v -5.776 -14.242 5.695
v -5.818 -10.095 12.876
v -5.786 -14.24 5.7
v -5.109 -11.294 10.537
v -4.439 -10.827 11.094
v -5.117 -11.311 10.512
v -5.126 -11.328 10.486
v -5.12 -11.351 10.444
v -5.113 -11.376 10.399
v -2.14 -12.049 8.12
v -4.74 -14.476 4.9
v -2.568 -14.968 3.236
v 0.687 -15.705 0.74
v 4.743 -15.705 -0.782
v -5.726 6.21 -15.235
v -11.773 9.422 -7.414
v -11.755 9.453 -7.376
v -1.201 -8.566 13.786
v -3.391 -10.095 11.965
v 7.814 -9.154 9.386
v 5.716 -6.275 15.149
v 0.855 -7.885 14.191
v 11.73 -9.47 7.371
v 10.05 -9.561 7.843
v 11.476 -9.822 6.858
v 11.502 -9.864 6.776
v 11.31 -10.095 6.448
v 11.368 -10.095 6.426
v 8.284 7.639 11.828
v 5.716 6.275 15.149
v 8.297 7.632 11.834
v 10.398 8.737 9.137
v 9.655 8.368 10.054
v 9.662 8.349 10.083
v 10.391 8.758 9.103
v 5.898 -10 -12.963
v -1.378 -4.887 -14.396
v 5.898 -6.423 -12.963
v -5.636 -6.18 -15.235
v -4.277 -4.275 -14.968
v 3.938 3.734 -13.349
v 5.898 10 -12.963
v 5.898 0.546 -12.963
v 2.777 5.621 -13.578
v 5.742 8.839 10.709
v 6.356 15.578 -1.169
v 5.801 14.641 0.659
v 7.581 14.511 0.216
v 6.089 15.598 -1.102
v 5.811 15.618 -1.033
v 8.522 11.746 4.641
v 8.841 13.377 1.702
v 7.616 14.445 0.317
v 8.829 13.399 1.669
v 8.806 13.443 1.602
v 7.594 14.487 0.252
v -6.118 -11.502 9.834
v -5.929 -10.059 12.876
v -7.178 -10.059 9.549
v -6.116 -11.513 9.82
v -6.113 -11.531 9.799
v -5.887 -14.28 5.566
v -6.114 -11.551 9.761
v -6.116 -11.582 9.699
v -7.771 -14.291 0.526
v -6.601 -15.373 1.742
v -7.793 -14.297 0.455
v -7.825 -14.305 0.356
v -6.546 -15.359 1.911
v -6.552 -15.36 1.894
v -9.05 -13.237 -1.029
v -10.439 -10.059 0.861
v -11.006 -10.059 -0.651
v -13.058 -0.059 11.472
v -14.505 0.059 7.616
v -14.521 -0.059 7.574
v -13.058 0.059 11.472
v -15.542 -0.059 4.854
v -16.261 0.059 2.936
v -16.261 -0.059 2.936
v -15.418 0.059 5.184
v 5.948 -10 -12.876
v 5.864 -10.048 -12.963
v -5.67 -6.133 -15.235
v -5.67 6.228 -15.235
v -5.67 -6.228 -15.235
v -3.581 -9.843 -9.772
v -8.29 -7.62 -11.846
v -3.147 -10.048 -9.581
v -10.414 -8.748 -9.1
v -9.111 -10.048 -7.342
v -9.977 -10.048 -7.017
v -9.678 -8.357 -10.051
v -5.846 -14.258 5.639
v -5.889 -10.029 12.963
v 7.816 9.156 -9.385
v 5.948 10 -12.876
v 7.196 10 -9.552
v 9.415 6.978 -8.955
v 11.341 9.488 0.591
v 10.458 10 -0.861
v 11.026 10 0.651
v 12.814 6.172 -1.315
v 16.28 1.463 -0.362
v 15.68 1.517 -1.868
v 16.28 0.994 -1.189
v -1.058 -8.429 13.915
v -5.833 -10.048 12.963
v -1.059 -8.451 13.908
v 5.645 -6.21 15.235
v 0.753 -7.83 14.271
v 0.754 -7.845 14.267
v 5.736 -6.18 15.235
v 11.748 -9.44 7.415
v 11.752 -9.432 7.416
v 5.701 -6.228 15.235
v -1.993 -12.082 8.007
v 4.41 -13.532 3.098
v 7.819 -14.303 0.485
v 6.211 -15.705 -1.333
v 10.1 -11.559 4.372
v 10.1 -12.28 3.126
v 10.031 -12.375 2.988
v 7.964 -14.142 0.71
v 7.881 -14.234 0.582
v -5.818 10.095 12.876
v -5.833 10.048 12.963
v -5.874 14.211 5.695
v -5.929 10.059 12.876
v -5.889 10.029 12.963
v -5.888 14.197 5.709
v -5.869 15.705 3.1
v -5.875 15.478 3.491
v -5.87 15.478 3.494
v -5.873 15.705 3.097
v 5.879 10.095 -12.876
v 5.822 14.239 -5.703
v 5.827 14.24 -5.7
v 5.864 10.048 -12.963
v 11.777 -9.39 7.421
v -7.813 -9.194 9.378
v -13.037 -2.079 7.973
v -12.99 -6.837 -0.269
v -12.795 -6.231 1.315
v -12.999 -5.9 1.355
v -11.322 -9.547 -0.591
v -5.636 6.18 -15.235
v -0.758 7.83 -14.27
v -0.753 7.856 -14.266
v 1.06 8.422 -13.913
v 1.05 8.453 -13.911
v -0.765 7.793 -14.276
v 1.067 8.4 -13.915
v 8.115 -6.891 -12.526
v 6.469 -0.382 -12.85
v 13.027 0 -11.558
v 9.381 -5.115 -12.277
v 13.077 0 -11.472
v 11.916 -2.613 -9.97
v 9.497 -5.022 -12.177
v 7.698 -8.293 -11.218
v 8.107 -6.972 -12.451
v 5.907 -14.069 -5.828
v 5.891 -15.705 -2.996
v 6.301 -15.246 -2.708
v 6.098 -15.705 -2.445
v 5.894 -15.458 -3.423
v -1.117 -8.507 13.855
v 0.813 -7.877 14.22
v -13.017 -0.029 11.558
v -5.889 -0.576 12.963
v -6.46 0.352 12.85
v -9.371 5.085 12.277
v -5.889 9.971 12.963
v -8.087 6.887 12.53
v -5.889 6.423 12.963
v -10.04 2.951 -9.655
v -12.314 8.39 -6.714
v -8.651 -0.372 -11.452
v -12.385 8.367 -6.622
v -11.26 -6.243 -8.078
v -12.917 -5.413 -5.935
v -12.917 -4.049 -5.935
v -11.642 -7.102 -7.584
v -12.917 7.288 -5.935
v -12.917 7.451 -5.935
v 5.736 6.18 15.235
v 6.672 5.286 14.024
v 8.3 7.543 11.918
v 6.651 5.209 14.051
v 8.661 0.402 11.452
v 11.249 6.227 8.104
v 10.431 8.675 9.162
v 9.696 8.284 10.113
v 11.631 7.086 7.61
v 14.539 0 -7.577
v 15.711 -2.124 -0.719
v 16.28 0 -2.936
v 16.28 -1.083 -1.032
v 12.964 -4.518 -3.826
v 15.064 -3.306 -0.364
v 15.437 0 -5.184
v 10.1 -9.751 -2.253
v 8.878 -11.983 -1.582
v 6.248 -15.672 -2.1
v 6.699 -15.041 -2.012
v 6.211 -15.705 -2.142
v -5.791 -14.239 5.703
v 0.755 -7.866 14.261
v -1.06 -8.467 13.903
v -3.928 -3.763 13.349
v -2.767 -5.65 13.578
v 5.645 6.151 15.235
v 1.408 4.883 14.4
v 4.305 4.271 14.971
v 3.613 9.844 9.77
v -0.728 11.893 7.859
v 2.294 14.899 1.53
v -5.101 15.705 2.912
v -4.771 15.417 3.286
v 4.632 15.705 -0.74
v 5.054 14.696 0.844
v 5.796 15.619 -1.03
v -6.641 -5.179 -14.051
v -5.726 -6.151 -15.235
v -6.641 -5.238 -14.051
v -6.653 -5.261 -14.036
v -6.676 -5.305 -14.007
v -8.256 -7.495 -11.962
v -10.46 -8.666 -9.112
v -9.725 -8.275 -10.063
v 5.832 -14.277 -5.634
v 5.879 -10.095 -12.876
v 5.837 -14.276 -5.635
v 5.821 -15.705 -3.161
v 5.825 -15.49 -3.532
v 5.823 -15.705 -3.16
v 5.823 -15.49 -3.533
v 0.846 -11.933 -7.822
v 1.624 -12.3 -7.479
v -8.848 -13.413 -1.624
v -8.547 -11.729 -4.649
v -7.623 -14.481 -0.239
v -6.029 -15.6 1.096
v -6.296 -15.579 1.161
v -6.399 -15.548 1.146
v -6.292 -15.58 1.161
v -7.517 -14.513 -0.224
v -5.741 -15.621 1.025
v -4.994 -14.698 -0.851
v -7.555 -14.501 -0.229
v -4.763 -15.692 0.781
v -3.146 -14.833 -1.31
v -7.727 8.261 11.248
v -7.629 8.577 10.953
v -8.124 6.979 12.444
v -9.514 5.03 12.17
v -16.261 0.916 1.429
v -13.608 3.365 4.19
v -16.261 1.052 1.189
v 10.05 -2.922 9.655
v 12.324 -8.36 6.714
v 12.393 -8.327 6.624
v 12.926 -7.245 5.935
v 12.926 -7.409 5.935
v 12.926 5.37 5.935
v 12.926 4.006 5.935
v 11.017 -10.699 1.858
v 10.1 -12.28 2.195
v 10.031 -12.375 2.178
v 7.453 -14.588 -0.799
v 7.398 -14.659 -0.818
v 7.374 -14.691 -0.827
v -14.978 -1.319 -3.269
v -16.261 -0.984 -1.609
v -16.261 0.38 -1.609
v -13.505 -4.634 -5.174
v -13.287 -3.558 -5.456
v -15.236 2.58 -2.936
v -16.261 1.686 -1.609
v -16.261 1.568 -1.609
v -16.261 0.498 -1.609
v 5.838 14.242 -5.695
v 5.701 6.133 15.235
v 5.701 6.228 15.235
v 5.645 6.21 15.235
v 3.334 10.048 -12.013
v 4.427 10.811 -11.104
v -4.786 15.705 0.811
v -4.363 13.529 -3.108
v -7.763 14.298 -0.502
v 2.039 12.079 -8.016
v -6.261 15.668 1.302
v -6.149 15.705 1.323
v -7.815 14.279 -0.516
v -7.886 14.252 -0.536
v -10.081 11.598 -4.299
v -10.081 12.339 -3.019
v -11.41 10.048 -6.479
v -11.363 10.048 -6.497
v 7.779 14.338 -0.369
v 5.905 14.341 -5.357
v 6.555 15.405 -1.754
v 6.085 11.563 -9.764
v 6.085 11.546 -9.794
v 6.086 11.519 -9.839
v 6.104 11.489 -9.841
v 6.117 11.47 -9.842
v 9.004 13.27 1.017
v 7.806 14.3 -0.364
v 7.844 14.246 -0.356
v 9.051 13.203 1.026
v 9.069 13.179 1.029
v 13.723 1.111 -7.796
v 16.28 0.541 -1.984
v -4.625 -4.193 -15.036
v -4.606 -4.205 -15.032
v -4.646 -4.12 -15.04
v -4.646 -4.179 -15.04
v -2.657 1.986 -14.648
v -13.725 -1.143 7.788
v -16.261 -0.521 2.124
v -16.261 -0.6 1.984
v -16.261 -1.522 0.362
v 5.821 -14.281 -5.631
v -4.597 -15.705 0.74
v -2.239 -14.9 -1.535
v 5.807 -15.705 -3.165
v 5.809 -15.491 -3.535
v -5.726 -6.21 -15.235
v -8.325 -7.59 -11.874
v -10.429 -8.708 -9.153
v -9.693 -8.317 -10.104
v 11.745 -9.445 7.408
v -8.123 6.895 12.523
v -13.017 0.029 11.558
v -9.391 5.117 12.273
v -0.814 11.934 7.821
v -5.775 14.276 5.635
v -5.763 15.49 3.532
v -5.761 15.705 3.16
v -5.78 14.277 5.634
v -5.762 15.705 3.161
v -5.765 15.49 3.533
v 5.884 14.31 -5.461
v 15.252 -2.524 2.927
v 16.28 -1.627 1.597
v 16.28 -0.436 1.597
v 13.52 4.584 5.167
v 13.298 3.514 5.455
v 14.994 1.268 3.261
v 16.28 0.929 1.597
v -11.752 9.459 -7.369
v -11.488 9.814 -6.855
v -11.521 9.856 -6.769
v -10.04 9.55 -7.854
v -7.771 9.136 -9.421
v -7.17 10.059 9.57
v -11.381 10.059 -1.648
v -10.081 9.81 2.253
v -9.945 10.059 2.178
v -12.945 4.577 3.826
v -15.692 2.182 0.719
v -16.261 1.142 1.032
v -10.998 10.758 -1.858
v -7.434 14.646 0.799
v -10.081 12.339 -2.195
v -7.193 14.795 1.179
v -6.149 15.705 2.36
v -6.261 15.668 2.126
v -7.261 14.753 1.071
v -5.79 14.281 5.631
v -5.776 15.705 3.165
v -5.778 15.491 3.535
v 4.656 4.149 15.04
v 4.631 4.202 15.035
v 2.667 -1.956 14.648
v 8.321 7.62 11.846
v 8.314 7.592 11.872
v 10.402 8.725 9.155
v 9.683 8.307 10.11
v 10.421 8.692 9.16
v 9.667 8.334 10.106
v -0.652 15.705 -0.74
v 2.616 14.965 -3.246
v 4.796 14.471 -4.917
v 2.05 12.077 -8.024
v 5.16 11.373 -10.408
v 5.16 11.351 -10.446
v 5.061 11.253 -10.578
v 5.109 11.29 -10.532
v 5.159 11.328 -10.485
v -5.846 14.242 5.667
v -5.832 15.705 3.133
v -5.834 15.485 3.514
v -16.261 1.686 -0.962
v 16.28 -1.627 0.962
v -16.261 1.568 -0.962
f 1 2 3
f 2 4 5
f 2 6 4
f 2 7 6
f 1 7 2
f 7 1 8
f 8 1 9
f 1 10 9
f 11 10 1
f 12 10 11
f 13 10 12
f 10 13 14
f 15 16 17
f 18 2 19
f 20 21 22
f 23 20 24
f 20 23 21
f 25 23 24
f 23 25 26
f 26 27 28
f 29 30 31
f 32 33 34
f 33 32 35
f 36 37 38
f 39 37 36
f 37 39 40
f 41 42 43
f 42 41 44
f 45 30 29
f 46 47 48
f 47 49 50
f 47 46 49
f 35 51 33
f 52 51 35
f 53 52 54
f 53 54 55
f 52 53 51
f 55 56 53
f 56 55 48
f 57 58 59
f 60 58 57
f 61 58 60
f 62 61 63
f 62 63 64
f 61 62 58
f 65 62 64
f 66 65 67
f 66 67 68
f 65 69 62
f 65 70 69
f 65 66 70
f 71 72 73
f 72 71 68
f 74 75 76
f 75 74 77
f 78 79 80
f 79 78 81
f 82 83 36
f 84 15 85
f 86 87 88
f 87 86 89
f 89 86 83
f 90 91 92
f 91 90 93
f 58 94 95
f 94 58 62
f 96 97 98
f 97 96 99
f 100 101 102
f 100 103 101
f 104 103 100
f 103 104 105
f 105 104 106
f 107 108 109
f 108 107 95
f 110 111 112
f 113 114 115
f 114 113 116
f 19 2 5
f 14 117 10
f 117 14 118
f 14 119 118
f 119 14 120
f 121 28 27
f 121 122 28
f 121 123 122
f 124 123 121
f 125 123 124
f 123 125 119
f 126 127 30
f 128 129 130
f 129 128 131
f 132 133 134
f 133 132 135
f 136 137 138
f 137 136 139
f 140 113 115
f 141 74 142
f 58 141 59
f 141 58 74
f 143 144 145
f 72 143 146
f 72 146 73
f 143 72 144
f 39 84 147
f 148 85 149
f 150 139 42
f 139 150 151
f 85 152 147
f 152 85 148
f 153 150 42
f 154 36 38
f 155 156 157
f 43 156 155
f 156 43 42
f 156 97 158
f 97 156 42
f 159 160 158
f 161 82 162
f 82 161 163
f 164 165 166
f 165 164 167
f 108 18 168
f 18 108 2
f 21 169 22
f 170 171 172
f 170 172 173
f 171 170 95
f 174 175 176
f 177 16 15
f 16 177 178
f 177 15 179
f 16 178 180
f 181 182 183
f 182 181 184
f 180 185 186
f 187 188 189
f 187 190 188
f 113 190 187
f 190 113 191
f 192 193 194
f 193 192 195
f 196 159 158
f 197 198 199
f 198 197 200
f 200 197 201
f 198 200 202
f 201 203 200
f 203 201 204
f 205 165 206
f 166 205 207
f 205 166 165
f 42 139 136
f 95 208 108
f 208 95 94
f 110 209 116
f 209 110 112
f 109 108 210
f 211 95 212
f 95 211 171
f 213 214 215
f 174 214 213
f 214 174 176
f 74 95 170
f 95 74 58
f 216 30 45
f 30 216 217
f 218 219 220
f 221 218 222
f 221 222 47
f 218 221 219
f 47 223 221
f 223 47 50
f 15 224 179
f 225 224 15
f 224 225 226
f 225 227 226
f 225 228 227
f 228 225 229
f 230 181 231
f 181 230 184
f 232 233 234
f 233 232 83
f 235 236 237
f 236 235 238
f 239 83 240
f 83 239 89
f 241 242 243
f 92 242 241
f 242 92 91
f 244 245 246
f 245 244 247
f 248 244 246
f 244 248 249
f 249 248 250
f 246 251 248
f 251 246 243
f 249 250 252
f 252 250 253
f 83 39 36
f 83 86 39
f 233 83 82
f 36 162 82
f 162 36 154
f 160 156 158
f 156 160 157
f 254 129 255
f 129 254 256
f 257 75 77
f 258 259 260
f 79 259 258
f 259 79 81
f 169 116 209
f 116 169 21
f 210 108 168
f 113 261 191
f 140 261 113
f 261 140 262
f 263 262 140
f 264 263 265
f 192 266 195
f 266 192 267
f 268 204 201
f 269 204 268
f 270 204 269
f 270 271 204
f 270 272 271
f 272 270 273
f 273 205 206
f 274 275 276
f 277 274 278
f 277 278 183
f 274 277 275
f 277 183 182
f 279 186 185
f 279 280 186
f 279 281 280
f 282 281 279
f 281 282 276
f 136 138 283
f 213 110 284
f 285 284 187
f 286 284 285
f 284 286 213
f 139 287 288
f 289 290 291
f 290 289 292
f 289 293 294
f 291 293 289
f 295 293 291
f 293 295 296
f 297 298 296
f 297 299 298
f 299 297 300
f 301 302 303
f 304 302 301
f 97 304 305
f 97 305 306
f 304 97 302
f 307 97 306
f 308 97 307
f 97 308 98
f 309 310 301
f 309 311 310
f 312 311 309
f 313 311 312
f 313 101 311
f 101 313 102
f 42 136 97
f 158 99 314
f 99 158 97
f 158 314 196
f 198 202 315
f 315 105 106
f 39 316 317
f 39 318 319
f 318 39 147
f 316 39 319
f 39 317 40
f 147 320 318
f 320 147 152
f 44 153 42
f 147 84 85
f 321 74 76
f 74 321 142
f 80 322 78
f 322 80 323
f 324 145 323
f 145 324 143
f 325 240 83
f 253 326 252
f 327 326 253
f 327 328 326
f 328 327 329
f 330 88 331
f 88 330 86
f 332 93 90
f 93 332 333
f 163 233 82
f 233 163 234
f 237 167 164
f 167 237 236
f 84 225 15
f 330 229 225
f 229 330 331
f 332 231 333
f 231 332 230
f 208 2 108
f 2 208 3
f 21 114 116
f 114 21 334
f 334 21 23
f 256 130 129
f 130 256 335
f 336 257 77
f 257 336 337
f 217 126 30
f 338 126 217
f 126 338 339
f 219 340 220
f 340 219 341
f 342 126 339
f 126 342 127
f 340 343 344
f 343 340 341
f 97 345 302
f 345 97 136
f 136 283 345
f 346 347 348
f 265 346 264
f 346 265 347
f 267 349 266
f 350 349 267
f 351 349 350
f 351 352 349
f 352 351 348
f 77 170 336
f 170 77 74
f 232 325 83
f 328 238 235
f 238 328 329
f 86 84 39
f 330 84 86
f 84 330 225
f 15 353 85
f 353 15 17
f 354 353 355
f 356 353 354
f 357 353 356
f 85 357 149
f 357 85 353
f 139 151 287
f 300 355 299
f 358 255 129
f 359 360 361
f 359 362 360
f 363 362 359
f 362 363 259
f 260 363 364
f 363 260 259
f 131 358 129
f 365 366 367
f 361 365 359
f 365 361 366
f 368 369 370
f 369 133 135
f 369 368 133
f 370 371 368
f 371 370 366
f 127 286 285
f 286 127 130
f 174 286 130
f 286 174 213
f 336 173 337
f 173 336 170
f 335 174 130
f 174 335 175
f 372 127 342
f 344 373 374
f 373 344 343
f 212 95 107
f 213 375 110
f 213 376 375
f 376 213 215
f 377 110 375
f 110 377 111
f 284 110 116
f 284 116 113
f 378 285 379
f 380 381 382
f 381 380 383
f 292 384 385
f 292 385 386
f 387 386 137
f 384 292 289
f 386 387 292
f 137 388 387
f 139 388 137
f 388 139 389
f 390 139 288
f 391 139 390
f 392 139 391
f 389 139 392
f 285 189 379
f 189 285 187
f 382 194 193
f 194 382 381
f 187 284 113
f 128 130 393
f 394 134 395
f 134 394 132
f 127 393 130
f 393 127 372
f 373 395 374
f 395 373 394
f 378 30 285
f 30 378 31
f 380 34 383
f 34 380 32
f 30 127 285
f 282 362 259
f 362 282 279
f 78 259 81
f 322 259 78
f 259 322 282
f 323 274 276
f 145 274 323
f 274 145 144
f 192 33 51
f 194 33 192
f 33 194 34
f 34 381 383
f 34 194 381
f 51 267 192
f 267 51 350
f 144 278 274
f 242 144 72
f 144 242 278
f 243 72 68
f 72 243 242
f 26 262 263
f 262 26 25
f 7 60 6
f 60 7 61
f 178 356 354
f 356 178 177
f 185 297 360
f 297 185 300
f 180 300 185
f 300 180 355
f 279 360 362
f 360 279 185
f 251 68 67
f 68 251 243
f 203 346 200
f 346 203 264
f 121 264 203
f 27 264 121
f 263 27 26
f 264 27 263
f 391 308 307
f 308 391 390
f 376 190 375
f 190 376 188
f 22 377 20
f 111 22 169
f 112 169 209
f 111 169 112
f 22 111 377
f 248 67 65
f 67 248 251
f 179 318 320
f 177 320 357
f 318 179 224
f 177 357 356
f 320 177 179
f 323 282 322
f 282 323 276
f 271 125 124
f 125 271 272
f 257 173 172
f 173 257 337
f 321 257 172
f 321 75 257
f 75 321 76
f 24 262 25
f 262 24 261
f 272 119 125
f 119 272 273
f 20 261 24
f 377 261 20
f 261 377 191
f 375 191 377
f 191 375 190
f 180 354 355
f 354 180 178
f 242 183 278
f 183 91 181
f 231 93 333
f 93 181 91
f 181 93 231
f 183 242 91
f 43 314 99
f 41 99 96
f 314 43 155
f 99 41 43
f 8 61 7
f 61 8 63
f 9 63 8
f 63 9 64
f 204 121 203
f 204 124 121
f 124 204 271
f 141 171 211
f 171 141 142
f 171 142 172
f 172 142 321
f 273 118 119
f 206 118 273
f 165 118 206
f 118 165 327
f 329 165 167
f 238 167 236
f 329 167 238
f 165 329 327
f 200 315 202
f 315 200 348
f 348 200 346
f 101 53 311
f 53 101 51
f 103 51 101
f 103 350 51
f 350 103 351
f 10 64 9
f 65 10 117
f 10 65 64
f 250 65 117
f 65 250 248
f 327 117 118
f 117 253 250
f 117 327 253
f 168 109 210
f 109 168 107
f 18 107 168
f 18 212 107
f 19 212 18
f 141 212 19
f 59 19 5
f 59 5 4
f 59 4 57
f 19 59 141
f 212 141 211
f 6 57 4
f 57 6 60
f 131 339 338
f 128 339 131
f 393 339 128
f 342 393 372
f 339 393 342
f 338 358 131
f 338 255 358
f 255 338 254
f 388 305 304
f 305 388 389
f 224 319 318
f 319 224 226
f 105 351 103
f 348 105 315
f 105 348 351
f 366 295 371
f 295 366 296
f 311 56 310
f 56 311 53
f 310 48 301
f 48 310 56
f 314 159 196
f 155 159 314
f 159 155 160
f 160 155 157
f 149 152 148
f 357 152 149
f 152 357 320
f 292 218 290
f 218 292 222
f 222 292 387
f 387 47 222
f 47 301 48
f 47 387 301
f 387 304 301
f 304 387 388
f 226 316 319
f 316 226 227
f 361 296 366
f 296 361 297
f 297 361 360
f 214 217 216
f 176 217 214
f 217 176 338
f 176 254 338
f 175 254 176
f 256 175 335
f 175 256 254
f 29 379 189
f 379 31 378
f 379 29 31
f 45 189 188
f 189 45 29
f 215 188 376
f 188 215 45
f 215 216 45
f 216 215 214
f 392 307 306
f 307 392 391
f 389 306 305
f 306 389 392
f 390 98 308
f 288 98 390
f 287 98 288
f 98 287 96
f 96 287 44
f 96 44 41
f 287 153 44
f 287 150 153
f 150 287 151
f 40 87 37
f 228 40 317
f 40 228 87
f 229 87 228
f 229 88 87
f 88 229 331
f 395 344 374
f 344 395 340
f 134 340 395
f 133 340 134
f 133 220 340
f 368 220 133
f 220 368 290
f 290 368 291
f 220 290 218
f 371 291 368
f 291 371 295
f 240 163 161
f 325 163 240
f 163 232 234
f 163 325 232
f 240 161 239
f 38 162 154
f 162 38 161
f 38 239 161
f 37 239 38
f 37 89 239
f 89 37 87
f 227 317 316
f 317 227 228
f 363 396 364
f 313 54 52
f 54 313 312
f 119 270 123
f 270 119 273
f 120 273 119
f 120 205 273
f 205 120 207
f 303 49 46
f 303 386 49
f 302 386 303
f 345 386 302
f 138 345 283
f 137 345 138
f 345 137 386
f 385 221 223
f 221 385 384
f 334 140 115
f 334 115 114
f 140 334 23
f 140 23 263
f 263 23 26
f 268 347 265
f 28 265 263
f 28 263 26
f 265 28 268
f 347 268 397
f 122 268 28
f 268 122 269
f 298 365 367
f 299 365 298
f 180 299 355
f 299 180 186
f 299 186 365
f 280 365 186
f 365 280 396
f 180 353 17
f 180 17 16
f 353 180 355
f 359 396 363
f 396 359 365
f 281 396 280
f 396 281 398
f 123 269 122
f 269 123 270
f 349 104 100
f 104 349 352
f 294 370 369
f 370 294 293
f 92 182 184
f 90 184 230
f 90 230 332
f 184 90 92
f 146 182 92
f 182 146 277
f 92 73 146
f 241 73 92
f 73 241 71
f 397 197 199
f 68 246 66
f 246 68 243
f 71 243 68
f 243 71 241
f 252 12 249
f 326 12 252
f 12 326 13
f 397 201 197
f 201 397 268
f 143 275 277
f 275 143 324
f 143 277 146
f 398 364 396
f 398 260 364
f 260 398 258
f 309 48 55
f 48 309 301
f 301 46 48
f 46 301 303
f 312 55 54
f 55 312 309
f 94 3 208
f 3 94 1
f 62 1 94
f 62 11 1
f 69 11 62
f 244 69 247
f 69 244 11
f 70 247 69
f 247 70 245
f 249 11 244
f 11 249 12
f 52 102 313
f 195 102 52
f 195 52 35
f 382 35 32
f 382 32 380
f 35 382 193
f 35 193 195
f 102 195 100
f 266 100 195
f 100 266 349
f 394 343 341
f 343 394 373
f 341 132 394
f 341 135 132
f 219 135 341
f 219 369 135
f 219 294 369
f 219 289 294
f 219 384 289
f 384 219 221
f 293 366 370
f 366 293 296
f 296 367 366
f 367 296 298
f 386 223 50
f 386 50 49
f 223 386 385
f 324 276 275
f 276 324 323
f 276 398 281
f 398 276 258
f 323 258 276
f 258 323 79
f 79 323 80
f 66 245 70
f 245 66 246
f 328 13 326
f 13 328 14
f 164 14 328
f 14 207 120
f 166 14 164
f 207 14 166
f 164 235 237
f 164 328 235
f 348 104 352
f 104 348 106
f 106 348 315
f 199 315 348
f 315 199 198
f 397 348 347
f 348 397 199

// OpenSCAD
// Auto-generated OpenSCAD file

    inner_points = 10*[[0.6180337298626563, -1.5609538290214546, -0.42597822997814533], [7.73802858806951e-08, -1.0222094171406149, 1.3982445807186372], [1.618034056077642, -0.16270937397933374, 0.59623103994357], [0.9999997310602456, -0.7014536305154738, -1.2279915887806803], [-1.0000000510624558, -1.2279913158853233, 0.701453652057864], [1.0000002689397194, 0.7014533791624705, 1.2279912943429379], [-0.9999997310602436, 0.7014536305154747, 1.2279915887806803], [1.000000051062458, 1.2279913158853242, -0.701453652057864], [-1.0000002689397172, -0.7014533791624696, -1.2279912943429379], [-0.6180337298626543, 1.5609538290214555, 0.42597822997814533], [-7.738028381207386e-08, 1.0222094171406158, -1.3982445807186372], [-1.6180340560776398, 0.1627093739793347, -0.59623103994357], [0.9999999489375068, -1.2279915672383273, 0.7014533576201214], [-0.6180342476371105, -1.5609536736767546, -0.425978048005613], [1.6180339214220893, 0.16270896728163117, -0.5962315163538447], [2.7515252983042934e-07, 0.1702531391567972, 1.7236629219795792], [0.6180342476371125, 1.5609536736767555, 0.425978048005613], [-1.6180339214220871, -0.16270896728163023, 0.5962315163538447], [-2.751525277618081e-07, -0.17025313915679627, -1.7236629219795792], [-0.9999999489375048, 1.2279915672383281, -0.7014533576201214]];

    outer_points = 10*[[-0.5685521372999673, 0.6180345674612486, -1.5148537027035407], [-0.5786225021475664, 1.6180339887497914, 0.21716816354827337], [-1.7320215313963447, 2.2104808258401205e-07, -0.010070490524902498], [-0.5685522926457485, -0.6180334100384619, -1.5148541166077656], [0.5786229088481014, 1.6180339887497914, -0.21716707993294407], [-1.297686287915155, -2.2104808258401205e-07, 1.1471749204706911], [0.5685522926457485, 0.6180334100384619, 1.5148541166077656], [-0.5786229088481014, -1.6180339887497914, 0.21716707993294407], [1.297686287915155, 2.2104808258401205e-07, -1.1471749204706911], [0.5685521372999673, -0.6180345674612486, 1.5148537027035407], [0.5786225021475664, -1.6180339887497914, -0.21716816354827337], [1.7320215313963447, -2.2104808258401205e-07, 0.010070490524902498], [-1.287615671712802, 1.0000003576632468, -0.5848462760700184], [0.5848467366030299, 1.0000003576632468, -1.2876154625345895], [-1.287615923067556, -0.9999996423366253, -0.5848469457811226], [-0.584846485248276, 0.9999996423366253, 1.2876161322456938], [-0.5848467366030299, -1.0000003576632468, 1.2876154625345895], [1.287615923067556, 0.9999996423366253, 0.5848469457811226], [0.584846485248276, -0.9999996423366253, -1.2876161322456938], [1.287615671712802, -1.0000003576632468, 0.5848462760700184]];

    // Convex hull for inner set (I)
    module inner_hull() {
        hull() {
            for (p = inner_points) {
                translate(p) sphere(r=0.1);
            }
        }
    }

    // Convex hull for outer set (O) minus inner hull (O \ I)
    module outer_minus_inner() {
        difference() {
            hull() {
                for (p = outer_points) {
                    translate(p) sphere(r=0.1);
                }
            }
            inner_hull(); // Subtract inner hull
        }
    }

    // Convex hull for outer set (O) minus all translated inner hulls
    module outer_minus_AllTranslationInner() {
        difference() {
            hull() {
                for (p = outer_points) {
                    translate(p) sphere(r=0.1);
                }
            }
            hull() {
                translate([0,0,5]) inner_hull();
                translate([0,0,-5]) inner_hull();
            }; // Subtract translated inner hulls
        }
    }

    // Difference between outer_minus_inner and outer_minus_AllTranslationInner
    module outer_minus_inner_diff() {
        difference() {
            // Outer minus inner
            difference() {
                hull() {
                    for (p = outer_points) {
                        translate(p) sphere(r=0.1);
                    }
                }
                inner_hull();
            }

            // Subtract Outer minus AllTranslationInner
            difference() {
                hull() {
                    for (p = outer_points) {
                        translate(p) sphere(r=0.1);
                    }
                }
                hull() {
                    translate([0,0,5]) inner_hull();
                    translate([0,0,-5]) inner_hull();
                };
            }
        }
    }

    // Rendering all with colors applied
    // color([1, 0, 0, 0.5]) inner_hull(); // Transparent red
    // color([0, 1, 0, 1]) outer_minus_AllTranslationInner(); // Opaque green
    color([1, 1, 0, 1]) outer_minus_inner_diff(); // Opaque yellow
    
